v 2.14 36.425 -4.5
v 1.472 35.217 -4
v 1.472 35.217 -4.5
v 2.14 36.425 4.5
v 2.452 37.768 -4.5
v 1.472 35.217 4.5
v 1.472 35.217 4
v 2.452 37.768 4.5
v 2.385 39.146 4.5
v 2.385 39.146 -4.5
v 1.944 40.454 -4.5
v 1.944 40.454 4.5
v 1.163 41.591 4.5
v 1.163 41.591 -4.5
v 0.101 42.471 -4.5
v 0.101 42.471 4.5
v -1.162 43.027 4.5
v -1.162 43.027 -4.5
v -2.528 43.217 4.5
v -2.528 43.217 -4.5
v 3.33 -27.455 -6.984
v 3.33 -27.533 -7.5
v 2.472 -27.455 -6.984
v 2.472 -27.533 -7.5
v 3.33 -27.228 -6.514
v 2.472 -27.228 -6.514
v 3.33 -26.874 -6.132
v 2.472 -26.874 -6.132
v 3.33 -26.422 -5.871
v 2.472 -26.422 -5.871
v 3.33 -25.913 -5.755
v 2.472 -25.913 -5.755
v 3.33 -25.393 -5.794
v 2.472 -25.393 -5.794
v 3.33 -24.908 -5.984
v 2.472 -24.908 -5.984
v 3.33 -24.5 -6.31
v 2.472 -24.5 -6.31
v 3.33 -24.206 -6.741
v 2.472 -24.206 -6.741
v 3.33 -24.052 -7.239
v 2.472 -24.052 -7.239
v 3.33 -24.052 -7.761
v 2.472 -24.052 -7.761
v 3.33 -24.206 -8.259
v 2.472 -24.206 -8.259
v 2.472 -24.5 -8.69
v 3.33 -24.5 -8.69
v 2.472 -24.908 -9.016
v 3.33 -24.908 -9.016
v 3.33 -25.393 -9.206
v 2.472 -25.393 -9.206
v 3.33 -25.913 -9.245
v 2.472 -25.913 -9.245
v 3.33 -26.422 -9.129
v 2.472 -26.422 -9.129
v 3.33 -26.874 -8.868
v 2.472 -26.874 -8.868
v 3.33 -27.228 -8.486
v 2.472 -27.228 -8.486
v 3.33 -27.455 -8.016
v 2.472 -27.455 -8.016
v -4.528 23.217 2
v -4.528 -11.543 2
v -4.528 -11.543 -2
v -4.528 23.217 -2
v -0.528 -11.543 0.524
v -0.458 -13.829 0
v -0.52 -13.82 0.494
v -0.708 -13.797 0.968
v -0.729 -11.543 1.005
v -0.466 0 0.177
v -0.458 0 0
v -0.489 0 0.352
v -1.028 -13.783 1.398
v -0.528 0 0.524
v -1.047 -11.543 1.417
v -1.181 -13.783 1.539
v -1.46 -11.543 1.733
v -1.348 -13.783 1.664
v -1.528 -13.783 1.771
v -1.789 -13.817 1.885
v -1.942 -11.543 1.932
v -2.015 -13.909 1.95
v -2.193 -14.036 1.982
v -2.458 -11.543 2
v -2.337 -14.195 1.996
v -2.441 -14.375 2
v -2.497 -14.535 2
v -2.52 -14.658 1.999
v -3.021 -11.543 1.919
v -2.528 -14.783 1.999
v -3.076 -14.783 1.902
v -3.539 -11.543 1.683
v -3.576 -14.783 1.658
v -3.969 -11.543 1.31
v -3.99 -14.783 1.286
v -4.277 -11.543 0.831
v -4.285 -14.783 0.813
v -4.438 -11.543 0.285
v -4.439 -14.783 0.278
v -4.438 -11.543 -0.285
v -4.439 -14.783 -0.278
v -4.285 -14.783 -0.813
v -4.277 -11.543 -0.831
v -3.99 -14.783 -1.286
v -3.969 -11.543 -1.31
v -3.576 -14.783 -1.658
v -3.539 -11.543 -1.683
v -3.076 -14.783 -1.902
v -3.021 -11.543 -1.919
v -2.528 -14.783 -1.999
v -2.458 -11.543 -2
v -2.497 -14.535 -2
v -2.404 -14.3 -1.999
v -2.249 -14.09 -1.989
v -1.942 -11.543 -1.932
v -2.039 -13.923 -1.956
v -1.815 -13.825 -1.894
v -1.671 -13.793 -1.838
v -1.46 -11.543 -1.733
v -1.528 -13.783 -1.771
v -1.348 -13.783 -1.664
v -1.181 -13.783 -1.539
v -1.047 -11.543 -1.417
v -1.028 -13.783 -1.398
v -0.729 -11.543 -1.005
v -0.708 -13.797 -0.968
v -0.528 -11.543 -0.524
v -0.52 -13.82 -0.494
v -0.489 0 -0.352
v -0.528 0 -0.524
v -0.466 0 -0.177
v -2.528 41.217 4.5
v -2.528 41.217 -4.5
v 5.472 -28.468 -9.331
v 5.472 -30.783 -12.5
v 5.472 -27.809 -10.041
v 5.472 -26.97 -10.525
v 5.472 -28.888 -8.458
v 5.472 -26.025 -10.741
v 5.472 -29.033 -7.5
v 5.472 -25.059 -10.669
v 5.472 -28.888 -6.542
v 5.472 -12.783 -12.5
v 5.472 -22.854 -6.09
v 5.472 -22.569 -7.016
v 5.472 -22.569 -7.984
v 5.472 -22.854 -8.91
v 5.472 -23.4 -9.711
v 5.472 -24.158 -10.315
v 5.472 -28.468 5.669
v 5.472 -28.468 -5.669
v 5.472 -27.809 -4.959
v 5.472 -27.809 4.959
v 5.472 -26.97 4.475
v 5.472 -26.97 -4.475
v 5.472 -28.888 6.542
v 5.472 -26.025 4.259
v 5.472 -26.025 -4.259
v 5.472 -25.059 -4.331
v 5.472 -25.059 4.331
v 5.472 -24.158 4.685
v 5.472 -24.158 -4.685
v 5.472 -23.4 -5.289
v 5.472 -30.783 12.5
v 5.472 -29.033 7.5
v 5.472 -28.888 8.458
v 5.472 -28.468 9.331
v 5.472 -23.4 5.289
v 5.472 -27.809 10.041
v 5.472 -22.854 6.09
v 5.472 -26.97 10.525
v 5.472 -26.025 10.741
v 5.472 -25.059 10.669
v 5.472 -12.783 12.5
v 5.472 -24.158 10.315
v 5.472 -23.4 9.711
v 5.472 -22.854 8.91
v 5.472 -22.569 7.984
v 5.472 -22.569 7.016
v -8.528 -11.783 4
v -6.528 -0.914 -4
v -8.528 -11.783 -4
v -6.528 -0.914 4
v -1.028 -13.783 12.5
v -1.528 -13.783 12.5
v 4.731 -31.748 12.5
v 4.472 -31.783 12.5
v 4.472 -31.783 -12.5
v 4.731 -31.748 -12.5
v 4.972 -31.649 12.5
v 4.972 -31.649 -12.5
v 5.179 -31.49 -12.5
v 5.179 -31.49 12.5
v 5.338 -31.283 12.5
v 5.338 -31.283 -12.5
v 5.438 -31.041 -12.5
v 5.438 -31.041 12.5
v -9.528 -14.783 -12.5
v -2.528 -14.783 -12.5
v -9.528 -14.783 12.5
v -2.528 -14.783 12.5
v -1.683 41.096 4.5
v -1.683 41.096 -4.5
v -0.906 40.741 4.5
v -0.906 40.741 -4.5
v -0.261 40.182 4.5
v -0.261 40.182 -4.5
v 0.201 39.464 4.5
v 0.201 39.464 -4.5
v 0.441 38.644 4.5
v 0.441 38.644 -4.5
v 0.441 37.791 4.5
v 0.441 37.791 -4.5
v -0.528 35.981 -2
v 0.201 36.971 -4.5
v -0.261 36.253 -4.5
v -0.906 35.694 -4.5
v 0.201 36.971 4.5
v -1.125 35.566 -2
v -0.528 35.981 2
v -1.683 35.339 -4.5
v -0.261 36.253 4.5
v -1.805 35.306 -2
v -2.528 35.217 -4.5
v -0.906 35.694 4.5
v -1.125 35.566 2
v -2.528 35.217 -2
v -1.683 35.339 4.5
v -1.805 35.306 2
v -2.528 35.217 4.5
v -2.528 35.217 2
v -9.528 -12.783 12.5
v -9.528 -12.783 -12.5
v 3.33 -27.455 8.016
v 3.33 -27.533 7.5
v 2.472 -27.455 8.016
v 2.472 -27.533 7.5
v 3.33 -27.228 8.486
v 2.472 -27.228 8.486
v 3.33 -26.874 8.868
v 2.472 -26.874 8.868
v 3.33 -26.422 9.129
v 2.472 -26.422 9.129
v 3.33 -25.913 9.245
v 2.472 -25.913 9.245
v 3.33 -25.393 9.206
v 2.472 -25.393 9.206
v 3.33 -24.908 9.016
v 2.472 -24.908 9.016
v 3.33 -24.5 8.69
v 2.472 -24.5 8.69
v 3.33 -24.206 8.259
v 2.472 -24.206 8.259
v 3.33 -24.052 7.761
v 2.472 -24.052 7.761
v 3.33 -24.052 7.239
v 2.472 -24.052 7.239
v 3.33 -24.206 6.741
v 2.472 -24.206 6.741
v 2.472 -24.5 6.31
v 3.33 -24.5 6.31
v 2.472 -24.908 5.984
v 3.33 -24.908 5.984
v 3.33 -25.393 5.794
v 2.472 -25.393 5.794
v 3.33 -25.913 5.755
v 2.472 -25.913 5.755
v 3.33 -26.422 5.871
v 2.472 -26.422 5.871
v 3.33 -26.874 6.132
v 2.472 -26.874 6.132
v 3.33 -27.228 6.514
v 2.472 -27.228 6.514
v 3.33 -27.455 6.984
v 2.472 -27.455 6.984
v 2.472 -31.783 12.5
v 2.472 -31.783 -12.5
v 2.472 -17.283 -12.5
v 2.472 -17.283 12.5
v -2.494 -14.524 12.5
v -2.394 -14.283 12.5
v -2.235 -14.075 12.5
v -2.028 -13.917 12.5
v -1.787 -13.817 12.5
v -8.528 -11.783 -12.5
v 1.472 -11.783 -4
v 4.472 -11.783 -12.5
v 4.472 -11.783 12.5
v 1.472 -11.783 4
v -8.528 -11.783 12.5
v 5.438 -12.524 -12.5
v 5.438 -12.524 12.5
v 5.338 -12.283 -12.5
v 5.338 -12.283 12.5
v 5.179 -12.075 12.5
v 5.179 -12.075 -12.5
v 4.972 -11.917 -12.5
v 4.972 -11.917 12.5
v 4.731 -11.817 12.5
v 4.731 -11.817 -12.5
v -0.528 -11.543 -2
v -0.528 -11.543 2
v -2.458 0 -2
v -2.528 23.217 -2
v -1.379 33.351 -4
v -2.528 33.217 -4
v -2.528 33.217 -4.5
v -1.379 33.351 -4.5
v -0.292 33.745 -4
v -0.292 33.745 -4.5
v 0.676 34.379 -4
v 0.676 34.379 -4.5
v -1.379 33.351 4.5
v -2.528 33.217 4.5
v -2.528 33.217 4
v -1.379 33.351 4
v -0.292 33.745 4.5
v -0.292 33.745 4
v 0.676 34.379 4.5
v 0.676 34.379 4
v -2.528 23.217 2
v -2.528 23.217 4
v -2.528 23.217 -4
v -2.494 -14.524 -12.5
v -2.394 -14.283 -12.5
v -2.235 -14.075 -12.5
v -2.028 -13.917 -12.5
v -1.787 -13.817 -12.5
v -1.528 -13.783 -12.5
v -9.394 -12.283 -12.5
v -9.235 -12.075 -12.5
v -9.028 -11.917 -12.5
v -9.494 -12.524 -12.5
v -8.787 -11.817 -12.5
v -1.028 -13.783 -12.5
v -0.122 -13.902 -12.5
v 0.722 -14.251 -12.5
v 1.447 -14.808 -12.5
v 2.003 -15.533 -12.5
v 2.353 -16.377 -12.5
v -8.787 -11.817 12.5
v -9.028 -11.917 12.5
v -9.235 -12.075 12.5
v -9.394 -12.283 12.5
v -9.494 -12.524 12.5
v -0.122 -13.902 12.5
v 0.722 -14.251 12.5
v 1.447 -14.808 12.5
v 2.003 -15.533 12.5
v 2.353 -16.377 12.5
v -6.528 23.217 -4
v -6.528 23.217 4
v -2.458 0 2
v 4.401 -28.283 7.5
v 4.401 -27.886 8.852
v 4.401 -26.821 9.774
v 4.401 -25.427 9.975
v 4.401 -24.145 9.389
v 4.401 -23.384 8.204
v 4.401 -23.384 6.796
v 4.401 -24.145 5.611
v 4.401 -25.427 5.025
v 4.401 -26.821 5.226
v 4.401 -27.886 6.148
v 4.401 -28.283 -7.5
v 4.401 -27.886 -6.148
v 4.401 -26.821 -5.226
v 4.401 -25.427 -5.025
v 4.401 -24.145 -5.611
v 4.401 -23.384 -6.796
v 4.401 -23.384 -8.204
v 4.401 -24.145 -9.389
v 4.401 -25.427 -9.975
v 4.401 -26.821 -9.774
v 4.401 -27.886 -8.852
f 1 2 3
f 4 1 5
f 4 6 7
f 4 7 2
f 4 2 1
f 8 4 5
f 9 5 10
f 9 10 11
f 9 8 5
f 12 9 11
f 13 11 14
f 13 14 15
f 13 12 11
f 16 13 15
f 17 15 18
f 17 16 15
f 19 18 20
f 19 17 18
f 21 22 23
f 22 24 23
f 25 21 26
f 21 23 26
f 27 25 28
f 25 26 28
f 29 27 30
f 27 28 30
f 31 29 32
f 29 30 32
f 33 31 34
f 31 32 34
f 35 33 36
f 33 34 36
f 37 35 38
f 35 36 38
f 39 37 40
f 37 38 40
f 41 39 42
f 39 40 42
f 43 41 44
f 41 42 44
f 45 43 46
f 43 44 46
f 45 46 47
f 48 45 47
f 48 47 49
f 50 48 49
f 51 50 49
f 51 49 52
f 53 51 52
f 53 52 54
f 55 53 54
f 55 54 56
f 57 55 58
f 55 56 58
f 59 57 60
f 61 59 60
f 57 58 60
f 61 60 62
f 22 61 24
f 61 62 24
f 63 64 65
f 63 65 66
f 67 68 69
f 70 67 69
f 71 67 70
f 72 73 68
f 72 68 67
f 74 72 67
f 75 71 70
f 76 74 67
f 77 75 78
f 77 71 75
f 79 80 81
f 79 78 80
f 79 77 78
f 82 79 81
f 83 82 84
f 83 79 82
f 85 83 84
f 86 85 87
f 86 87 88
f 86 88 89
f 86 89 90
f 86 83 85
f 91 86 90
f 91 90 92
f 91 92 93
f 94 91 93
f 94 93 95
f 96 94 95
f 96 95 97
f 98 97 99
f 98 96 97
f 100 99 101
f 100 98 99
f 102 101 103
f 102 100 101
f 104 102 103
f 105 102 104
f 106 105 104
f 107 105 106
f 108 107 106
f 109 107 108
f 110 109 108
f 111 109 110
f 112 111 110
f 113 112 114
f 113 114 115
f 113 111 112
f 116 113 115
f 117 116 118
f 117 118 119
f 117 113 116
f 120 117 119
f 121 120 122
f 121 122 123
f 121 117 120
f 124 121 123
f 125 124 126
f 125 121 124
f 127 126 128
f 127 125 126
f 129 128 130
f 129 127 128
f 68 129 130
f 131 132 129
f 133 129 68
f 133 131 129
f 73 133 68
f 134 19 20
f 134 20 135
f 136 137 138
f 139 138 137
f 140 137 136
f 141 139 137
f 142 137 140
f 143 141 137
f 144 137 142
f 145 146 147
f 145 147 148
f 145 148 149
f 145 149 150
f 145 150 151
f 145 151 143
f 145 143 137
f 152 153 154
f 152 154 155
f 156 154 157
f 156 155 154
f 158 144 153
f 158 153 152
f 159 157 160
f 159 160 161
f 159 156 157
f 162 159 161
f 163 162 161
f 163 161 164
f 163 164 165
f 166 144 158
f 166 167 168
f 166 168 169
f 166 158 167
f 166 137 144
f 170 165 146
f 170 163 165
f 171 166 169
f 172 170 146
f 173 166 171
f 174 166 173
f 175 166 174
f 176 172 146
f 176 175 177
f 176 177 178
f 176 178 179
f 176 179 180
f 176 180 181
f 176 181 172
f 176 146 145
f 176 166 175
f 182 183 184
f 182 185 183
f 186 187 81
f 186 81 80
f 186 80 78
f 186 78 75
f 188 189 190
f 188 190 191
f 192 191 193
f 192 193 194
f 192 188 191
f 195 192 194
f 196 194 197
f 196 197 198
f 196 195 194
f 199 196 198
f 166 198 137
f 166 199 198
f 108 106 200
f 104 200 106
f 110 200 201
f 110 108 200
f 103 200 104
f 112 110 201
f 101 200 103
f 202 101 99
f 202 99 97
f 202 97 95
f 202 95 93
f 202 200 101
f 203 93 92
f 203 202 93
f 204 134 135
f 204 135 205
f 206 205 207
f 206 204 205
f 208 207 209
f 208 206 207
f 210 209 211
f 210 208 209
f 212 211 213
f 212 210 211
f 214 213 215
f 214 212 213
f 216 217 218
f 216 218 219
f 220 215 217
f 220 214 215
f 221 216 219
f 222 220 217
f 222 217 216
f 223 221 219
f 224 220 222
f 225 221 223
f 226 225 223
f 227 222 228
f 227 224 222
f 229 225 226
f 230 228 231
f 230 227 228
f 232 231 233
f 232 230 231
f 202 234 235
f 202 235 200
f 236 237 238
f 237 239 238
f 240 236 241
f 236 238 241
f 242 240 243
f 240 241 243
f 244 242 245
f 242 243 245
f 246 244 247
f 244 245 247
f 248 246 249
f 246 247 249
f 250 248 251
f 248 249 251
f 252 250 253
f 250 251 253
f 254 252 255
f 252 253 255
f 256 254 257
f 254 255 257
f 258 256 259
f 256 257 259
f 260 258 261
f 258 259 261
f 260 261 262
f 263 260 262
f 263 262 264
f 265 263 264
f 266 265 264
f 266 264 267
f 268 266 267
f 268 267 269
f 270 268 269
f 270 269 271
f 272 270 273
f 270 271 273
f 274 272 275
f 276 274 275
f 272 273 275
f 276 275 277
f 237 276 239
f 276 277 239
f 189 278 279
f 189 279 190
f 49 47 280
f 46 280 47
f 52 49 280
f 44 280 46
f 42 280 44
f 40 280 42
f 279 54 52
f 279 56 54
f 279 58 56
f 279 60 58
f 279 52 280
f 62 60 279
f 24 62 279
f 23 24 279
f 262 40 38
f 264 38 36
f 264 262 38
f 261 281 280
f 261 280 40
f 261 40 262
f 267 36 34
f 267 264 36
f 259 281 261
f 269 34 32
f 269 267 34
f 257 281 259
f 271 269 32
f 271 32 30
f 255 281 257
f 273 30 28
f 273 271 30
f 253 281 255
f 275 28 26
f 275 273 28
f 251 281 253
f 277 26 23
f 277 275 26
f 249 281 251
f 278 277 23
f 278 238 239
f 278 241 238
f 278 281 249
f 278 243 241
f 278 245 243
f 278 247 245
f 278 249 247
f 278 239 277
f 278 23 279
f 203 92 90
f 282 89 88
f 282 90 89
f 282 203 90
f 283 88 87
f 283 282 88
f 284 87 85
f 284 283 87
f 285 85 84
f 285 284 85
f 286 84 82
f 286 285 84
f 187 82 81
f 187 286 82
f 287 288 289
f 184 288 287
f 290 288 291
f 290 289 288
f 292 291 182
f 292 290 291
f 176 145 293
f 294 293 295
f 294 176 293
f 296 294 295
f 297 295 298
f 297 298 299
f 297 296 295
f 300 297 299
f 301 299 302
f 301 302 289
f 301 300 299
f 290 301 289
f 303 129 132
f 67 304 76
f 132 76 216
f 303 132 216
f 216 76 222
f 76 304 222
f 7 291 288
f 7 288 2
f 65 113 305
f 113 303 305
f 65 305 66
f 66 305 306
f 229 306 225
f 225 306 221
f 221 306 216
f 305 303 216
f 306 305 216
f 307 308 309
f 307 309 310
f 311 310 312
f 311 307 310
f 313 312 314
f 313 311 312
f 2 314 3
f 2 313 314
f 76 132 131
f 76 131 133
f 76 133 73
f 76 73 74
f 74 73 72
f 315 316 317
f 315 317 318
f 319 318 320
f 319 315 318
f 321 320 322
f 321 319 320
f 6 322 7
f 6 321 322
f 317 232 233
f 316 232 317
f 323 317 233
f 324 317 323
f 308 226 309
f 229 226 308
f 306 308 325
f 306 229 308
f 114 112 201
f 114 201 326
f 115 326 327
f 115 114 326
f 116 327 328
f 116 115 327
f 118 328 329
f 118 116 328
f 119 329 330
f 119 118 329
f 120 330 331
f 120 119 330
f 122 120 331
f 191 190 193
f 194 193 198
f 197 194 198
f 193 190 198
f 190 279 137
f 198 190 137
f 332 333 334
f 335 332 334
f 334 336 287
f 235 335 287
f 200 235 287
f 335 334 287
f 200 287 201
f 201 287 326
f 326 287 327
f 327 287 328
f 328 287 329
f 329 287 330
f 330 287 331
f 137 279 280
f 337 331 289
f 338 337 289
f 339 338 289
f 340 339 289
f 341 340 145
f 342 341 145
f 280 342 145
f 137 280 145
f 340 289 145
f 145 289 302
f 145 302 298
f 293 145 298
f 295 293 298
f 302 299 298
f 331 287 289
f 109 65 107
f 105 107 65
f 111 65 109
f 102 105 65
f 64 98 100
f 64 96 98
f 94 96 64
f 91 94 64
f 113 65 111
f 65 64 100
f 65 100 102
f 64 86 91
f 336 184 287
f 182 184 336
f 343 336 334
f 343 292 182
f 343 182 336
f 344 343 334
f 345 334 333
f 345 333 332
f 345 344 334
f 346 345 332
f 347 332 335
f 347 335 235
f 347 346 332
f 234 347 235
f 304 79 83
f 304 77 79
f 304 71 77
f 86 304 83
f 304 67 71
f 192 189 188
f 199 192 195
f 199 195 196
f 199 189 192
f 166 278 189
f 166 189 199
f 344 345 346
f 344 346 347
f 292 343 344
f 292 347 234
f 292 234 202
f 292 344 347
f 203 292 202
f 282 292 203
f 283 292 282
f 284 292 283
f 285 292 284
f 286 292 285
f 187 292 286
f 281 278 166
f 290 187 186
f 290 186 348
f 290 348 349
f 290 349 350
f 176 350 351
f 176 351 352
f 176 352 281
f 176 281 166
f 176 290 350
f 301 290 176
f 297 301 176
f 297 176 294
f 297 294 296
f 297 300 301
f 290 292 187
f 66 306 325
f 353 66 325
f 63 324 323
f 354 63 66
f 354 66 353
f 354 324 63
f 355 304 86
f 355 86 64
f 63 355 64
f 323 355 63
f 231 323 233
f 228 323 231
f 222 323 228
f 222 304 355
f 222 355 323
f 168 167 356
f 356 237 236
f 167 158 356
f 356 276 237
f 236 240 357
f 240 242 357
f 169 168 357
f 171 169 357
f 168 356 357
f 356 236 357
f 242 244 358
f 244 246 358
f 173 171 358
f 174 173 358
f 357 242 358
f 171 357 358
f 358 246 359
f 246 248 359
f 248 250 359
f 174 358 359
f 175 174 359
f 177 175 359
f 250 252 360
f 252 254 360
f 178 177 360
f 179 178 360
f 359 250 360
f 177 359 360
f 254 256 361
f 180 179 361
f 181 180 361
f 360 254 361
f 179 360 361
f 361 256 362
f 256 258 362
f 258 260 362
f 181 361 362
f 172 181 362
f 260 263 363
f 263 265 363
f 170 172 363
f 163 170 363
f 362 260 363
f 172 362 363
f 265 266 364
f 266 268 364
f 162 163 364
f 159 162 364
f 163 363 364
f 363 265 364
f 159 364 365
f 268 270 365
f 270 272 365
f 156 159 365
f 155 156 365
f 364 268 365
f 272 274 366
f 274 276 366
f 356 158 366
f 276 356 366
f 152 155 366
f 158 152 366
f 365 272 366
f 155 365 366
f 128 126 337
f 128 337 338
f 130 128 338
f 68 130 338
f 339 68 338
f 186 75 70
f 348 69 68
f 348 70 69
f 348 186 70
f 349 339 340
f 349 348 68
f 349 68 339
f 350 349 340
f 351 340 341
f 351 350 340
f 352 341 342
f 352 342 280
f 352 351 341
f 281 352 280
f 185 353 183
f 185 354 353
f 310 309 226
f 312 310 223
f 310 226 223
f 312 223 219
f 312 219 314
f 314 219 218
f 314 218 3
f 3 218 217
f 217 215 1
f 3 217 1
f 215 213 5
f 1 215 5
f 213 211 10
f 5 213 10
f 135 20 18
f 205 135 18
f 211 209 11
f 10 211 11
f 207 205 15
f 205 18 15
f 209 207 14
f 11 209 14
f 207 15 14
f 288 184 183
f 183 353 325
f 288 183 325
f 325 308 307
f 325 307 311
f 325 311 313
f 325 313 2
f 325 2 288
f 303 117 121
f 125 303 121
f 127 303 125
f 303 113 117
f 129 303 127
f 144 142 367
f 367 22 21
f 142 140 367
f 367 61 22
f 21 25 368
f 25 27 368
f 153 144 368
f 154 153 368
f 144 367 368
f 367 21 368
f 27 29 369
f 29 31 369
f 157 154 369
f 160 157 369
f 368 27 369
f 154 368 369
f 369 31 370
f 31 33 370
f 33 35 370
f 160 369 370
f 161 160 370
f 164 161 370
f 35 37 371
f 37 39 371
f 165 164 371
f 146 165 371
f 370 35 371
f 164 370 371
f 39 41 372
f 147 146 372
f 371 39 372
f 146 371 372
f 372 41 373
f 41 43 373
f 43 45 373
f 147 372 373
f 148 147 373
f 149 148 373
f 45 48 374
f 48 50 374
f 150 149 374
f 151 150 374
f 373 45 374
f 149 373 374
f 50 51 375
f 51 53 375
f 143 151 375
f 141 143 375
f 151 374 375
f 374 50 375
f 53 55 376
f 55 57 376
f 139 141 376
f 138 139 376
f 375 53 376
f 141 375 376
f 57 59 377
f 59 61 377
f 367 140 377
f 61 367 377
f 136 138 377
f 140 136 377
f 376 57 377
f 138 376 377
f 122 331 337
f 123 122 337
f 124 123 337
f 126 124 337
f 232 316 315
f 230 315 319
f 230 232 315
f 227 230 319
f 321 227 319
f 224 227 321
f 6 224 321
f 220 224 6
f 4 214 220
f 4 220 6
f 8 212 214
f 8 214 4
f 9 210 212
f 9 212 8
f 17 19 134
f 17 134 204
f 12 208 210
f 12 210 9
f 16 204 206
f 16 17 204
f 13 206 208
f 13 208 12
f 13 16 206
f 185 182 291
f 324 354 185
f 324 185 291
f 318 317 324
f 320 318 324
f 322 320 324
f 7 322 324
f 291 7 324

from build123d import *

# Parameters (mm, degrees)
F1_DEPTH       = 12.5
F3_D           = 3.5
F3_CSINK_D     = 6.5
F3_CSINK_ANGLE = 70
F4_DEPTH       = 4
F5_DEPTH       = 4.5
F7_W           = 48.072574
F7_H           = 4
F8_DEPTH       = 2
F9_R           = 2
F10_DEPTH      = 19.3


with BuildPart() as f1:
    # F0 (on Top) → F1 (new body, symmetric)
    with BuildSketch(Plane.XY):
        with BuildLine():
            Line((1.472, -11.782544), (-8.527783, -11.782544))
            ThreePointArc((-8.527783, -11.782544), (-9.23489, -12.075437), (-9.527783, -12.782544))
            Line((-9.527783, -12.782544), (-9.527783, -14.782544))
            Line((-9.527783, -14.782544), (-2.527783, -14.782544))
            ThreePointArc((-2.527783, -14.782544), (-2.23489, -14.075437), (-1.527783, -13.782544))
            Line((-1.527783, -13.782544), (-1.027783, -13.782544))
            ThreePointArc((-1.027783, -13.782544), (1.447091, -14.80767), (2.472217, -17.282544))
            Line((2.472217, -17.282544), (2.472217, -31.782544))
            Line((2.472217, -31.782544), (4.472217, -31.782544))
            ThreePointArc((4.472217, -31.782544), (5.179324, -31.489651), (5.472217, -30.782544))
            Line((5.472217, -30.782544), (5.472217, -12.782544))
            ThreePointArc((5.472217, -12.782544), (5.179324, -12.075437), (4.472217, -11.782544))
            Line((4.472217, -11.782544), (1.472, -11.782544))
        make_face()
    extrude(amount=F1_DEPTH, both=True)

    # F3 (through all)
    with Locations(Plane.YZ.offset(5.472217)):
        with Locations((-25.782544, 7.5), (-25.782544, -7.5)):
            CounterSinkHole(F3_D / 2, F3_CSINK_D / 2, counter_sink_angle=F3_CSINK_ANGLE)

    # F0 (on Top) → F4 (join, symmetric)
    with BuildSketch(Plane.XY):
        with BuildLine():
            Line((-6.528, -0.913868), (-8.527783, -11.782544))
            Line((-8.527783, -11.782544), (1.472, -11.782544))
            Line((1.472, -11.782544), (1.472, 35.217456))
            ThreePointArc((1.472, 35.217456), (-0.291932, 33.74532), (-2.528, 33.217456))
            Line((-2.528, 33.217456), (-2.528, 23.217456))
            Line((-2.528, 23.217456), (-6.528, 23.217456))
            Line((-6.528, 23.217456), (-6.528, -0.913868))
        make_face()
    extrude(amount=F4_DEPTH, both=True)

    # F0 (on Top) → F5 (join, symmetric)
    with BuildSketch(Plane.XY):
        with BuildLine():
            ThreePointArc((-2.528, 33.217456), (-0.291932, 33.74532), (1.472, 35.217456))
            ThreePointArc((1.472, 35.217456), (1.944136, 40.453524), (-2.528, 43.217456))
            Line((-2.528, 43.217456), (-2.528, 41.217456))
            ThreePointArc((-2.528, 41.217456), (0.472, 38.217456), (-2.528, 35.217456))
            Line((-2.528, 35.217456), (-2.528, 33.217456))
        make_face()
    extrude(amount=F5_DEPTH, both=True)

    # F7 (on offset) → F8 (cut, symmetric)
    with BuildSketch(Plane.YZ.offset(-2.528)):
        with Locations((12.492837, 0)):
            Rectangle(F7_W, F7_H)
    extrude(amount=F8_DEPTH, both=True, mode=Mode.SUBTRACT)

    # F9 (on Front) → F10 (cut)
    with BuildSketch(Plane.XZ):
        with Locations((-2.458, 0)):
            Circle(F9_R)
    extrude(amount=F10_DEPTH, mode=Mode.SUBTRACT)


solid = f1.part
